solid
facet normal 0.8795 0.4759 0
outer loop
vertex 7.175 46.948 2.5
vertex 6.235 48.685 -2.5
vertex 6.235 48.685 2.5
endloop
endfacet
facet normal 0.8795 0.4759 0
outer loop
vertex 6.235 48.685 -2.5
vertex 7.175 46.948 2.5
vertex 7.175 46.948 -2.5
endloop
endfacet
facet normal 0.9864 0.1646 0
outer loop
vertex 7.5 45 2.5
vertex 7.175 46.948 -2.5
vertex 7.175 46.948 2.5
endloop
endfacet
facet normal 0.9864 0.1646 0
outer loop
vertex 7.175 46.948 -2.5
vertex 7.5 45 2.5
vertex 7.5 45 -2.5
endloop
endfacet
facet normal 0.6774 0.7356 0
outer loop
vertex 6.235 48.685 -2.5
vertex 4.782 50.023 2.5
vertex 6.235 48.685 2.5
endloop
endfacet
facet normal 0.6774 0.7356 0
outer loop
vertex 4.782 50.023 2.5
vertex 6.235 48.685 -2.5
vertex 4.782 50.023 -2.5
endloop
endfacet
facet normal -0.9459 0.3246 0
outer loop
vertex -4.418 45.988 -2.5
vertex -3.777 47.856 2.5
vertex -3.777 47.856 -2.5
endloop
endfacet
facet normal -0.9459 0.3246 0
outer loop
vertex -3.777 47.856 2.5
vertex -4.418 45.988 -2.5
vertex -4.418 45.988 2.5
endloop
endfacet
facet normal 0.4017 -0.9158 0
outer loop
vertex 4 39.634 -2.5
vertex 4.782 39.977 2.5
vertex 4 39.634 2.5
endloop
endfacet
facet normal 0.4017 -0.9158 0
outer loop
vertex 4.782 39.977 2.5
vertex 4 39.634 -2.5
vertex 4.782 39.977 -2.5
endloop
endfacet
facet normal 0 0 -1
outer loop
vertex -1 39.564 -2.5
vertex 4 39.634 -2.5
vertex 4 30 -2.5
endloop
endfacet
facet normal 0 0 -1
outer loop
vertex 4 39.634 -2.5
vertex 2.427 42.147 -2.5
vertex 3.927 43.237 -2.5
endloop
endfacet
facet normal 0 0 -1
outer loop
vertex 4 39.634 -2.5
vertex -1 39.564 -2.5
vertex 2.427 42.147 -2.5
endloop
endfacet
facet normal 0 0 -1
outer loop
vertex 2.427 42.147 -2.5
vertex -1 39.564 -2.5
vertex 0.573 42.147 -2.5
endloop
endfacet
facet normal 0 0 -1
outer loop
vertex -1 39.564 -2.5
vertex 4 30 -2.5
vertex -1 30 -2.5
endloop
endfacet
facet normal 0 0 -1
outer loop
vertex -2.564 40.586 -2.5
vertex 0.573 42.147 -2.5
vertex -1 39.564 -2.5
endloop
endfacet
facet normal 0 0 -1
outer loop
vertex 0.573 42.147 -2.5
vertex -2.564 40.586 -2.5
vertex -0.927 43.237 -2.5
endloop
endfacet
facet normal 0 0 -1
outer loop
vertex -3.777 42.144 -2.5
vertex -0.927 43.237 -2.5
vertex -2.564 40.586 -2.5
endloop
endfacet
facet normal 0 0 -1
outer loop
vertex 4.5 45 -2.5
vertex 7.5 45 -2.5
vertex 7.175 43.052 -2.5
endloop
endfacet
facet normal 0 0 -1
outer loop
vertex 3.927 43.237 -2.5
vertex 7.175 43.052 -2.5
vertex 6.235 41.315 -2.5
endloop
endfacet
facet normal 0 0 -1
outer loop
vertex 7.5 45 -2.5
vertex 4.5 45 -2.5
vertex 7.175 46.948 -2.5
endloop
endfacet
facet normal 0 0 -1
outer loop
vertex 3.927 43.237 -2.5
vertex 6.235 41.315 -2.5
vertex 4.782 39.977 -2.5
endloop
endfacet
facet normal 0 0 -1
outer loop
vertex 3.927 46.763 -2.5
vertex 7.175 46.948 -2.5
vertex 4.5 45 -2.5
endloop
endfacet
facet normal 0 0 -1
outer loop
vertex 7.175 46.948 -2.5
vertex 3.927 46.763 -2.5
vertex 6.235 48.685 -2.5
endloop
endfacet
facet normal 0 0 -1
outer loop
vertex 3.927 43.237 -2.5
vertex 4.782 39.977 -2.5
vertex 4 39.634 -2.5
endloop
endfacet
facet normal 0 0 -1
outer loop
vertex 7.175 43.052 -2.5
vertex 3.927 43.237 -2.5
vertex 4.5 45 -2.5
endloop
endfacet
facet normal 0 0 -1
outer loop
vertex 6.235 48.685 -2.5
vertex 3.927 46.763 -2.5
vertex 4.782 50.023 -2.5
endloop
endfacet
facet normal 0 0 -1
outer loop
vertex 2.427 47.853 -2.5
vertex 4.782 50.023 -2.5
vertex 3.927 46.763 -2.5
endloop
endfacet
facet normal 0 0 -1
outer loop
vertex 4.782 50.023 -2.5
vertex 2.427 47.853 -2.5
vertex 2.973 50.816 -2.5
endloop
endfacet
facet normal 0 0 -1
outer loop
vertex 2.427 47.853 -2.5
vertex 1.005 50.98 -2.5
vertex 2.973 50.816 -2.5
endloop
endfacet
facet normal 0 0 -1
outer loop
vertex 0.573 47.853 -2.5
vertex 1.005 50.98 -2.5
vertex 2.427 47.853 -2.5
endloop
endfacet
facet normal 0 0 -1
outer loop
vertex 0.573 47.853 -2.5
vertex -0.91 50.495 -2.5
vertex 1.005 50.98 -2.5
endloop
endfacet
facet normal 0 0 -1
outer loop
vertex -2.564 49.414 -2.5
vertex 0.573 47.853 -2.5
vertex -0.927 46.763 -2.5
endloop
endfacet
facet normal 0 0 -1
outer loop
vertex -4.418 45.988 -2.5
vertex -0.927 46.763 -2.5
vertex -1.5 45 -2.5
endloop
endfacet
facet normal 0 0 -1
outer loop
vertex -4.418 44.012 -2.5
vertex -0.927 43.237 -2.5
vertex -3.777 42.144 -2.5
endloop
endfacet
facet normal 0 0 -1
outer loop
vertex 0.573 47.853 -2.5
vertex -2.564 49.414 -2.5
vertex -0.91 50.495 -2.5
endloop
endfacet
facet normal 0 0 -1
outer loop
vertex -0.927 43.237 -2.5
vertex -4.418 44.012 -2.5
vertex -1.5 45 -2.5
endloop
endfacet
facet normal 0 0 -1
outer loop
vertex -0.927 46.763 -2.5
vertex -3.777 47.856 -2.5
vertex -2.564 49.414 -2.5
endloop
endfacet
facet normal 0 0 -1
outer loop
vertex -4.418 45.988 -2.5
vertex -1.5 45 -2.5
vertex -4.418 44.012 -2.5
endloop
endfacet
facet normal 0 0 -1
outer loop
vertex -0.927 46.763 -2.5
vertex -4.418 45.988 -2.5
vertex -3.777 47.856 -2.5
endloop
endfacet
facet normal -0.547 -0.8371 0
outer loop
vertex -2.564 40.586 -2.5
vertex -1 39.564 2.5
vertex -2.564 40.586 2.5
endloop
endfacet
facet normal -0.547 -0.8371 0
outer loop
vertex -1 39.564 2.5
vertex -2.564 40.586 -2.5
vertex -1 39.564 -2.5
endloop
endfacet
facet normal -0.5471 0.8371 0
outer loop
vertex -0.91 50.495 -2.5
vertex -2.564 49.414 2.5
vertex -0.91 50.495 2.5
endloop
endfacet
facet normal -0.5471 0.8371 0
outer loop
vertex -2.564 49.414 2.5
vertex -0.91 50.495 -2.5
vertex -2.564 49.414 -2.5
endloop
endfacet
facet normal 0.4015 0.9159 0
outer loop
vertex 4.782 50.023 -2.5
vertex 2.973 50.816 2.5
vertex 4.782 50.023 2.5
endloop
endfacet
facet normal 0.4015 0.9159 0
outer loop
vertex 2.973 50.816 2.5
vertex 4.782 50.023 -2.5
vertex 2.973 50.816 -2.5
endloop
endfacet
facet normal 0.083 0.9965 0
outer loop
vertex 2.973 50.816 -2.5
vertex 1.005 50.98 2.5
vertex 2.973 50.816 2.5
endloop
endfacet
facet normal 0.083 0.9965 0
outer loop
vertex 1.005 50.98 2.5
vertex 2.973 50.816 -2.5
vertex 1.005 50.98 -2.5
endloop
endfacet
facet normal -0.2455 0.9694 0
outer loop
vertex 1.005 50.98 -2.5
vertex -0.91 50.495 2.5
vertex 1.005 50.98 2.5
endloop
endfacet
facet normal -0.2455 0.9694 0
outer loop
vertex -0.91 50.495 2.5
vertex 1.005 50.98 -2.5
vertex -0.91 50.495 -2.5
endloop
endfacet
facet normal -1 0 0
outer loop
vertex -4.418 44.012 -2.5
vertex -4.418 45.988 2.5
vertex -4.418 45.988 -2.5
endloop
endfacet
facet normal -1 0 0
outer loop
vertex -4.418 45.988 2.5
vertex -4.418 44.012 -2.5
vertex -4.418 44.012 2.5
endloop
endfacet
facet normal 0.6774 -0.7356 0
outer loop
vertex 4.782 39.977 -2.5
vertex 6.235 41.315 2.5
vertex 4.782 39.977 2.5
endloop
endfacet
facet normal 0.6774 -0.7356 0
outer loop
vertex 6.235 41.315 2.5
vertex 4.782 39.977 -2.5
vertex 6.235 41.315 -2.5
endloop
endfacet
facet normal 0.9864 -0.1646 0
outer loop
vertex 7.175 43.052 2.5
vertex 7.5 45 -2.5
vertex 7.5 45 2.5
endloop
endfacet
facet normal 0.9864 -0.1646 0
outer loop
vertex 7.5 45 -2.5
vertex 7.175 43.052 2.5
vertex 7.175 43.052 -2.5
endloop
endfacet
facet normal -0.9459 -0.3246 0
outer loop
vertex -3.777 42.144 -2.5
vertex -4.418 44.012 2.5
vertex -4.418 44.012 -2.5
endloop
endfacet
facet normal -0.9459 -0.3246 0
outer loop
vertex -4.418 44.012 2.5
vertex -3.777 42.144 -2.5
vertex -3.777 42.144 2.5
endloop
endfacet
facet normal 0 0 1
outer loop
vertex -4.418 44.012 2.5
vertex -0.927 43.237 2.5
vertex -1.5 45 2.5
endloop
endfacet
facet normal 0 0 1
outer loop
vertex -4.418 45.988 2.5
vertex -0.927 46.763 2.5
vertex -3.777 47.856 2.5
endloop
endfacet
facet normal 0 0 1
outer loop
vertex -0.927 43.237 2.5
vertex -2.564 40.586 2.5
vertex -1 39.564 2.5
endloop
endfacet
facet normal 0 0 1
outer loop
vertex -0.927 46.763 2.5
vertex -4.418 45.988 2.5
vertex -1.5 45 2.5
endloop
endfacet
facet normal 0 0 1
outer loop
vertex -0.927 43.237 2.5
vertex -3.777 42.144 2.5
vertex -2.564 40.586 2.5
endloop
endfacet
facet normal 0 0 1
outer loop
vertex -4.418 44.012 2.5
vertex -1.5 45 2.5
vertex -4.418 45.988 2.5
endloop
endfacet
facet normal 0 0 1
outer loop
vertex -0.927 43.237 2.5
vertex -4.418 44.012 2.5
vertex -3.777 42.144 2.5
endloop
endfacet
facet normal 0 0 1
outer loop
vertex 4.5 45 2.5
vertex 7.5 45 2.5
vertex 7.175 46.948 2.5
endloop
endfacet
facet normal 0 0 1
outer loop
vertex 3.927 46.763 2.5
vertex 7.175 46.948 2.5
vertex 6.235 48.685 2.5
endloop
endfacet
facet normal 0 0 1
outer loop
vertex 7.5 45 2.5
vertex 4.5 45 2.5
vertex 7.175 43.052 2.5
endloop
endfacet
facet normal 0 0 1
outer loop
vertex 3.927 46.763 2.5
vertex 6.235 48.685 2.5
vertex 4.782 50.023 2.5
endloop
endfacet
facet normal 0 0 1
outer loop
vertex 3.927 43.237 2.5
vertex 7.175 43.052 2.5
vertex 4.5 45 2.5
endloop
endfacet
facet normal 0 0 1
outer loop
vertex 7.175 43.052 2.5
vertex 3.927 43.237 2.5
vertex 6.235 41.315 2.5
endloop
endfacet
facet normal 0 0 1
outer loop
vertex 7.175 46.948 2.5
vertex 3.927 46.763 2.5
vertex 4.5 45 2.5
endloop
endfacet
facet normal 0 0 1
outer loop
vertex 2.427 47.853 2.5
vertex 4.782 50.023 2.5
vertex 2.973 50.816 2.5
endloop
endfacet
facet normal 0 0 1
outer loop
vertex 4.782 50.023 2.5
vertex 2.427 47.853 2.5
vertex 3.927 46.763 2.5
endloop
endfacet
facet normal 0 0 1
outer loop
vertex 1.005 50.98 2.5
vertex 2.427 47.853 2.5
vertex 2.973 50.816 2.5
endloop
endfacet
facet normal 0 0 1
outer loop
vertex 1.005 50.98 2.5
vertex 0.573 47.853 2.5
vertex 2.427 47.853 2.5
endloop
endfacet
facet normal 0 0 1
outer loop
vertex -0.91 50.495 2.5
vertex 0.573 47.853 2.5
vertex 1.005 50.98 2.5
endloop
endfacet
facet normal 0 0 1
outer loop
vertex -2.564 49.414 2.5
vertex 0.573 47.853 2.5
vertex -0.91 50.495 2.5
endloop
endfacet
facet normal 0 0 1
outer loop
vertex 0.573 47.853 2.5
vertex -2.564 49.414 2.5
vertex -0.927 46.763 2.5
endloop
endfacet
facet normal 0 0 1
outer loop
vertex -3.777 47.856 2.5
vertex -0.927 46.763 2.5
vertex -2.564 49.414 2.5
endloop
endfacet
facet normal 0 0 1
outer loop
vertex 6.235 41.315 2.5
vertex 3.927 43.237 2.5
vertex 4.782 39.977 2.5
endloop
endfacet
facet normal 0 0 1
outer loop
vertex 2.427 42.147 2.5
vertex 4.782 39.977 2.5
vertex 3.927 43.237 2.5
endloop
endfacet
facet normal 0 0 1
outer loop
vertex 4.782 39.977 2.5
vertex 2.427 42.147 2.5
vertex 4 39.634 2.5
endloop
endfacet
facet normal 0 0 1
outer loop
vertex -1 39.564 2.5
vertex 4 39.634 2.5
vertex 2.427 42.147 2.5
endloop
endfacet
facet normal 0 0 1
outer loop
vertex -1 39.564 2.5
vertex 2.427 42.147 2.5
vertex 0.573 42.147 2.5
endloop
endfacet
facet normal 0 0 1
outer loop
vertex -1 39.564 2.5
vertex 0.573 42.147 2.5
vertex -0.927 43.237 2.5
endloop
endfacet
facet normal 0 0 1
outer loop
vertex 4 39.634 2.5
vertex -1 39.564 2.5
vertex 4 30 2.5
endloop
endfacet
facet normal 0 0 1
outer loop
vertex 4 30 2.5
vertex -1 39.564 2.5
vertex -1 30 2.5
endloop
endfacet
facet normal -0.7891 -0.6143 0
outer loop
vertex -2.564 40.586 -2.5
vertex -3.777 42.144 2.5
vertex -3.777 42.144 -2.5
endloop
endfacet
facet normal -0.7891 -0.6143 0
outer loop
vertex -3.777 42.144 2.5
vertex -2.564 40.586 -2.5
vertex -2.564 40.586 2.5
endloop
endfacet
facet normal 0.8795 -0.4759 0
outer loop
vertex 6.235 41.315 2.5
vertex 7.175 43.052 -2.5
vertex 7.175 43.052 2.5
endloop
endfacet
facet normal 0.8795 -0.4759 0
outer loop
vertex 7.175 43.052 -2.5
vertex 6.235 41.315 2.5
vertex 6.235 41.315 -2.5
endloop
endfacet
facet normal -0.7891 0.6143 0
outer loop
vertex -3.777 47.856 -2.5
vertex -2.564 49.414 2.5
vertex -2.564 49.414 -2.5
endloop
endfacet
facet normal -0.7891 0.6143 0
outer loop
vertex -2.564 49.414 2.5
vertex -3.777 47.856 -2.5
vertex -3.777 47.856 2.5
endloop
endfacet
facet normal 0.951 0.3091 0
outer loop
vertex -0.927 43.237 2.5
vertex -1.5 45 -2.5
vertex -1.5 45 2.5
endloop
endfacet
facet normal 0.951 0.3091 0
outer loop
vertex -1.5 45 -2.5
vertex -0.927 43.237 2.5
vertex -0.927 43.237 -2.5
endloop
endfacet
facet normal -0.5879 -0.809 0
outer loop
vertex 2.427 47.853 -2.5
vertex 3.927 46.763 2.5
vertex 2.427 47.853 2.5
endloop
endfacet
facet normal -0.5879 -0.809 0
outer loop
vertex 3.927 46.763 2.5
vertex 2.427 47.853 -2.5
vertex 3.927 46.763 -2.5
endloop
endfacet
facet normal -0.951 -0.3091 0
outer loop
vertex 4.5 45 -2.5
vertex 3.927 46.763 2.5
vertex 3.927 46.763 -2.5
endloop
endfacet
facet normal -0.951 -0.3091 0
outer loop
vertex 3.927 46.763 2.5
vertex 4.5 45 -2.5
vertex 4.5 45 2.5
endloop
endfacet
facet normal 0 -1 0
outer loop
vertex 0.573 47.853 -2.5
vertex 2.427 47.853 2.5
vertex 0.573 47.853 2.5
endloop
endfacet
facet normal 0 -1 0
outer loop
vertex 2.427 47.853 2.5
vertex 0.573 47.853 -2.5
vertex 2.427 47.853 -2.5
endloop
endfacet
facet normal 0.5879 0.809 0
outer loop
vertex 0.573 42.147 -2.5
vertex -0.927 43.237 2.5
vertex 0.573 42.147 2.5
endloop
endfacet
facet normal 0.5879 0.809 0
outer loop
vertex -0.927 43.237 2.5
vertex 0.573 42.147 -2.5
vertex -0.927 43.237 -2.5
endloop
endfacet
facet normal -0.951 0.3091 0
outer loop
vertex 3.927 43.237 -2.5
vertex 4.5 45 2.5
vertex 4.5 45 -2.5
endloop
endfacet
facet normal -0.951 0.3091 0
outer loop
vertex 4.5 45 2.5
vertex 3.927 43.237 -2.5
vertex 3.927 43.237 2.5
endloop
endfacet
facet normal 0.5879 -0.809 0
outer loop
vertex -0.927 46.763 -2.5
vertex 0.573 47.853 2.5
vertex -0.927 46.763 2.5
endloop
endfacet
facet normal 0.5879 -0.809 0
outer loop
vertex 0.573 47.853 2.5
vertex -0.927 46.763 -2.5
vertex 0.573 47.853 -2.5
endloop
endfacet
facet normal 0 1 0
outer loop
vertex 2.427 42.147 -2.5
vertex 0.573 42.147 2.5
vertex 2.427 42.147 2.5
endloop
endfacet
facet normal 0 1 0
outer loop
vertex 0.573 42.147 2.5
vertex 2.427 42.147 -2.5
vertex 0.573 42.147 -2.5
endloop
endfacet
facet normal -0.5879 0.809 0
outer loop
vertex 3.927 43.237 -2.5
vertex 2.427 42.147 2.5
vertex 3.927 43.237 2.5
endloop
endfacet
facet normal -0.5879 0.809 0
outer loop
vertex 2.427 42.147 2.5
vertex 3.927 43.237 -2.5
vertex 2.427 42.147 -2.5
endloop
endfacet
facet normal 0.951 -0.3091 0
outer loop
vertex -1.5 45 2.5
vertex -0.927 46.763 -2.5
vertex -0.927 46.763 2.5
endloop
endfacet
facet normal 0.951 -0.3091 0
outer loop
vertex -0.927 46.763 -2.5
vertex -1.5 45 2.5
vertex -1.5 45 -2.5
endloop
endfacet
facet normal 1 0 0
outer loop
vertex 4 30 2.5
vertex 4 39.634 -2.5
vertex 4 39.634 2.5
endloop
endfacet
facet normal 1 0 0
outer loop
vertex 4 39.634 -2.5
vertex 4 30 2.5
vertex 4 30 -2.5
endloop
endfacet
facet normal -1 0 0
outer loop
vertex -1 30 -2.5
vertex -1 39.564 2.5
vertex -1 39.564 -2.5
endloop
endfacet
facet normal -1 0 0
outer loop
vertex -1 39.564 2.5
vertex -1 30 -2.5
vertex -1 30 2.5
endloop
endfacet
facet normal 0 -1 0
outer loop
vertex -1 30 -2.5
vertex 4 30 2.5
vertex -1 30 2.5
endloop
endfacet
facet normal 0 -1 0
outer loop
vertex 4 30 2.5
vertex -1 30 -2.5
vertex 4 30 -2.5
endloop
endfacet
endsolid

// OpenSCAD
h = 5;
filename = "duck.dxf";
scale = 0.23;

module feature(){
		translate([1,26,0])scale([scale,scale,1])translate([0,0,-h/2])linear_extrude(height = h) import(filename);
}

module six_feature(){
	union() {
		for(i = [0:360 / 6:360]){
			rotate([0,0,i]) feature();
		}
	}
}

module base(){
	difference(){
		scale([0.7,0.7,1]) translate([0,0,-h/2])linear_extrude(height = h) import("snowflake.dxf");
		cut();
	}
}


module loop() {
	translate([1.5,45,0]) {
		union(){
			difference() {
				cylinder(h,6,6, center = true);
				cylinder(h,3,3, center = true);
			}
			translate([0,-10,0])cube([5,10,5], center = true);
		}
	}
}

module cut() {
	translate([0,0,-5])
	difference() {
		cylinder(2 * h,80,80);
		cylinder(2 * h,20,20);
	}
}

union() {
	six_feature();
	base();
	loop();
}

//translate([0,0,-5]) color([0,1,0]) cylinder(h,40,40);
